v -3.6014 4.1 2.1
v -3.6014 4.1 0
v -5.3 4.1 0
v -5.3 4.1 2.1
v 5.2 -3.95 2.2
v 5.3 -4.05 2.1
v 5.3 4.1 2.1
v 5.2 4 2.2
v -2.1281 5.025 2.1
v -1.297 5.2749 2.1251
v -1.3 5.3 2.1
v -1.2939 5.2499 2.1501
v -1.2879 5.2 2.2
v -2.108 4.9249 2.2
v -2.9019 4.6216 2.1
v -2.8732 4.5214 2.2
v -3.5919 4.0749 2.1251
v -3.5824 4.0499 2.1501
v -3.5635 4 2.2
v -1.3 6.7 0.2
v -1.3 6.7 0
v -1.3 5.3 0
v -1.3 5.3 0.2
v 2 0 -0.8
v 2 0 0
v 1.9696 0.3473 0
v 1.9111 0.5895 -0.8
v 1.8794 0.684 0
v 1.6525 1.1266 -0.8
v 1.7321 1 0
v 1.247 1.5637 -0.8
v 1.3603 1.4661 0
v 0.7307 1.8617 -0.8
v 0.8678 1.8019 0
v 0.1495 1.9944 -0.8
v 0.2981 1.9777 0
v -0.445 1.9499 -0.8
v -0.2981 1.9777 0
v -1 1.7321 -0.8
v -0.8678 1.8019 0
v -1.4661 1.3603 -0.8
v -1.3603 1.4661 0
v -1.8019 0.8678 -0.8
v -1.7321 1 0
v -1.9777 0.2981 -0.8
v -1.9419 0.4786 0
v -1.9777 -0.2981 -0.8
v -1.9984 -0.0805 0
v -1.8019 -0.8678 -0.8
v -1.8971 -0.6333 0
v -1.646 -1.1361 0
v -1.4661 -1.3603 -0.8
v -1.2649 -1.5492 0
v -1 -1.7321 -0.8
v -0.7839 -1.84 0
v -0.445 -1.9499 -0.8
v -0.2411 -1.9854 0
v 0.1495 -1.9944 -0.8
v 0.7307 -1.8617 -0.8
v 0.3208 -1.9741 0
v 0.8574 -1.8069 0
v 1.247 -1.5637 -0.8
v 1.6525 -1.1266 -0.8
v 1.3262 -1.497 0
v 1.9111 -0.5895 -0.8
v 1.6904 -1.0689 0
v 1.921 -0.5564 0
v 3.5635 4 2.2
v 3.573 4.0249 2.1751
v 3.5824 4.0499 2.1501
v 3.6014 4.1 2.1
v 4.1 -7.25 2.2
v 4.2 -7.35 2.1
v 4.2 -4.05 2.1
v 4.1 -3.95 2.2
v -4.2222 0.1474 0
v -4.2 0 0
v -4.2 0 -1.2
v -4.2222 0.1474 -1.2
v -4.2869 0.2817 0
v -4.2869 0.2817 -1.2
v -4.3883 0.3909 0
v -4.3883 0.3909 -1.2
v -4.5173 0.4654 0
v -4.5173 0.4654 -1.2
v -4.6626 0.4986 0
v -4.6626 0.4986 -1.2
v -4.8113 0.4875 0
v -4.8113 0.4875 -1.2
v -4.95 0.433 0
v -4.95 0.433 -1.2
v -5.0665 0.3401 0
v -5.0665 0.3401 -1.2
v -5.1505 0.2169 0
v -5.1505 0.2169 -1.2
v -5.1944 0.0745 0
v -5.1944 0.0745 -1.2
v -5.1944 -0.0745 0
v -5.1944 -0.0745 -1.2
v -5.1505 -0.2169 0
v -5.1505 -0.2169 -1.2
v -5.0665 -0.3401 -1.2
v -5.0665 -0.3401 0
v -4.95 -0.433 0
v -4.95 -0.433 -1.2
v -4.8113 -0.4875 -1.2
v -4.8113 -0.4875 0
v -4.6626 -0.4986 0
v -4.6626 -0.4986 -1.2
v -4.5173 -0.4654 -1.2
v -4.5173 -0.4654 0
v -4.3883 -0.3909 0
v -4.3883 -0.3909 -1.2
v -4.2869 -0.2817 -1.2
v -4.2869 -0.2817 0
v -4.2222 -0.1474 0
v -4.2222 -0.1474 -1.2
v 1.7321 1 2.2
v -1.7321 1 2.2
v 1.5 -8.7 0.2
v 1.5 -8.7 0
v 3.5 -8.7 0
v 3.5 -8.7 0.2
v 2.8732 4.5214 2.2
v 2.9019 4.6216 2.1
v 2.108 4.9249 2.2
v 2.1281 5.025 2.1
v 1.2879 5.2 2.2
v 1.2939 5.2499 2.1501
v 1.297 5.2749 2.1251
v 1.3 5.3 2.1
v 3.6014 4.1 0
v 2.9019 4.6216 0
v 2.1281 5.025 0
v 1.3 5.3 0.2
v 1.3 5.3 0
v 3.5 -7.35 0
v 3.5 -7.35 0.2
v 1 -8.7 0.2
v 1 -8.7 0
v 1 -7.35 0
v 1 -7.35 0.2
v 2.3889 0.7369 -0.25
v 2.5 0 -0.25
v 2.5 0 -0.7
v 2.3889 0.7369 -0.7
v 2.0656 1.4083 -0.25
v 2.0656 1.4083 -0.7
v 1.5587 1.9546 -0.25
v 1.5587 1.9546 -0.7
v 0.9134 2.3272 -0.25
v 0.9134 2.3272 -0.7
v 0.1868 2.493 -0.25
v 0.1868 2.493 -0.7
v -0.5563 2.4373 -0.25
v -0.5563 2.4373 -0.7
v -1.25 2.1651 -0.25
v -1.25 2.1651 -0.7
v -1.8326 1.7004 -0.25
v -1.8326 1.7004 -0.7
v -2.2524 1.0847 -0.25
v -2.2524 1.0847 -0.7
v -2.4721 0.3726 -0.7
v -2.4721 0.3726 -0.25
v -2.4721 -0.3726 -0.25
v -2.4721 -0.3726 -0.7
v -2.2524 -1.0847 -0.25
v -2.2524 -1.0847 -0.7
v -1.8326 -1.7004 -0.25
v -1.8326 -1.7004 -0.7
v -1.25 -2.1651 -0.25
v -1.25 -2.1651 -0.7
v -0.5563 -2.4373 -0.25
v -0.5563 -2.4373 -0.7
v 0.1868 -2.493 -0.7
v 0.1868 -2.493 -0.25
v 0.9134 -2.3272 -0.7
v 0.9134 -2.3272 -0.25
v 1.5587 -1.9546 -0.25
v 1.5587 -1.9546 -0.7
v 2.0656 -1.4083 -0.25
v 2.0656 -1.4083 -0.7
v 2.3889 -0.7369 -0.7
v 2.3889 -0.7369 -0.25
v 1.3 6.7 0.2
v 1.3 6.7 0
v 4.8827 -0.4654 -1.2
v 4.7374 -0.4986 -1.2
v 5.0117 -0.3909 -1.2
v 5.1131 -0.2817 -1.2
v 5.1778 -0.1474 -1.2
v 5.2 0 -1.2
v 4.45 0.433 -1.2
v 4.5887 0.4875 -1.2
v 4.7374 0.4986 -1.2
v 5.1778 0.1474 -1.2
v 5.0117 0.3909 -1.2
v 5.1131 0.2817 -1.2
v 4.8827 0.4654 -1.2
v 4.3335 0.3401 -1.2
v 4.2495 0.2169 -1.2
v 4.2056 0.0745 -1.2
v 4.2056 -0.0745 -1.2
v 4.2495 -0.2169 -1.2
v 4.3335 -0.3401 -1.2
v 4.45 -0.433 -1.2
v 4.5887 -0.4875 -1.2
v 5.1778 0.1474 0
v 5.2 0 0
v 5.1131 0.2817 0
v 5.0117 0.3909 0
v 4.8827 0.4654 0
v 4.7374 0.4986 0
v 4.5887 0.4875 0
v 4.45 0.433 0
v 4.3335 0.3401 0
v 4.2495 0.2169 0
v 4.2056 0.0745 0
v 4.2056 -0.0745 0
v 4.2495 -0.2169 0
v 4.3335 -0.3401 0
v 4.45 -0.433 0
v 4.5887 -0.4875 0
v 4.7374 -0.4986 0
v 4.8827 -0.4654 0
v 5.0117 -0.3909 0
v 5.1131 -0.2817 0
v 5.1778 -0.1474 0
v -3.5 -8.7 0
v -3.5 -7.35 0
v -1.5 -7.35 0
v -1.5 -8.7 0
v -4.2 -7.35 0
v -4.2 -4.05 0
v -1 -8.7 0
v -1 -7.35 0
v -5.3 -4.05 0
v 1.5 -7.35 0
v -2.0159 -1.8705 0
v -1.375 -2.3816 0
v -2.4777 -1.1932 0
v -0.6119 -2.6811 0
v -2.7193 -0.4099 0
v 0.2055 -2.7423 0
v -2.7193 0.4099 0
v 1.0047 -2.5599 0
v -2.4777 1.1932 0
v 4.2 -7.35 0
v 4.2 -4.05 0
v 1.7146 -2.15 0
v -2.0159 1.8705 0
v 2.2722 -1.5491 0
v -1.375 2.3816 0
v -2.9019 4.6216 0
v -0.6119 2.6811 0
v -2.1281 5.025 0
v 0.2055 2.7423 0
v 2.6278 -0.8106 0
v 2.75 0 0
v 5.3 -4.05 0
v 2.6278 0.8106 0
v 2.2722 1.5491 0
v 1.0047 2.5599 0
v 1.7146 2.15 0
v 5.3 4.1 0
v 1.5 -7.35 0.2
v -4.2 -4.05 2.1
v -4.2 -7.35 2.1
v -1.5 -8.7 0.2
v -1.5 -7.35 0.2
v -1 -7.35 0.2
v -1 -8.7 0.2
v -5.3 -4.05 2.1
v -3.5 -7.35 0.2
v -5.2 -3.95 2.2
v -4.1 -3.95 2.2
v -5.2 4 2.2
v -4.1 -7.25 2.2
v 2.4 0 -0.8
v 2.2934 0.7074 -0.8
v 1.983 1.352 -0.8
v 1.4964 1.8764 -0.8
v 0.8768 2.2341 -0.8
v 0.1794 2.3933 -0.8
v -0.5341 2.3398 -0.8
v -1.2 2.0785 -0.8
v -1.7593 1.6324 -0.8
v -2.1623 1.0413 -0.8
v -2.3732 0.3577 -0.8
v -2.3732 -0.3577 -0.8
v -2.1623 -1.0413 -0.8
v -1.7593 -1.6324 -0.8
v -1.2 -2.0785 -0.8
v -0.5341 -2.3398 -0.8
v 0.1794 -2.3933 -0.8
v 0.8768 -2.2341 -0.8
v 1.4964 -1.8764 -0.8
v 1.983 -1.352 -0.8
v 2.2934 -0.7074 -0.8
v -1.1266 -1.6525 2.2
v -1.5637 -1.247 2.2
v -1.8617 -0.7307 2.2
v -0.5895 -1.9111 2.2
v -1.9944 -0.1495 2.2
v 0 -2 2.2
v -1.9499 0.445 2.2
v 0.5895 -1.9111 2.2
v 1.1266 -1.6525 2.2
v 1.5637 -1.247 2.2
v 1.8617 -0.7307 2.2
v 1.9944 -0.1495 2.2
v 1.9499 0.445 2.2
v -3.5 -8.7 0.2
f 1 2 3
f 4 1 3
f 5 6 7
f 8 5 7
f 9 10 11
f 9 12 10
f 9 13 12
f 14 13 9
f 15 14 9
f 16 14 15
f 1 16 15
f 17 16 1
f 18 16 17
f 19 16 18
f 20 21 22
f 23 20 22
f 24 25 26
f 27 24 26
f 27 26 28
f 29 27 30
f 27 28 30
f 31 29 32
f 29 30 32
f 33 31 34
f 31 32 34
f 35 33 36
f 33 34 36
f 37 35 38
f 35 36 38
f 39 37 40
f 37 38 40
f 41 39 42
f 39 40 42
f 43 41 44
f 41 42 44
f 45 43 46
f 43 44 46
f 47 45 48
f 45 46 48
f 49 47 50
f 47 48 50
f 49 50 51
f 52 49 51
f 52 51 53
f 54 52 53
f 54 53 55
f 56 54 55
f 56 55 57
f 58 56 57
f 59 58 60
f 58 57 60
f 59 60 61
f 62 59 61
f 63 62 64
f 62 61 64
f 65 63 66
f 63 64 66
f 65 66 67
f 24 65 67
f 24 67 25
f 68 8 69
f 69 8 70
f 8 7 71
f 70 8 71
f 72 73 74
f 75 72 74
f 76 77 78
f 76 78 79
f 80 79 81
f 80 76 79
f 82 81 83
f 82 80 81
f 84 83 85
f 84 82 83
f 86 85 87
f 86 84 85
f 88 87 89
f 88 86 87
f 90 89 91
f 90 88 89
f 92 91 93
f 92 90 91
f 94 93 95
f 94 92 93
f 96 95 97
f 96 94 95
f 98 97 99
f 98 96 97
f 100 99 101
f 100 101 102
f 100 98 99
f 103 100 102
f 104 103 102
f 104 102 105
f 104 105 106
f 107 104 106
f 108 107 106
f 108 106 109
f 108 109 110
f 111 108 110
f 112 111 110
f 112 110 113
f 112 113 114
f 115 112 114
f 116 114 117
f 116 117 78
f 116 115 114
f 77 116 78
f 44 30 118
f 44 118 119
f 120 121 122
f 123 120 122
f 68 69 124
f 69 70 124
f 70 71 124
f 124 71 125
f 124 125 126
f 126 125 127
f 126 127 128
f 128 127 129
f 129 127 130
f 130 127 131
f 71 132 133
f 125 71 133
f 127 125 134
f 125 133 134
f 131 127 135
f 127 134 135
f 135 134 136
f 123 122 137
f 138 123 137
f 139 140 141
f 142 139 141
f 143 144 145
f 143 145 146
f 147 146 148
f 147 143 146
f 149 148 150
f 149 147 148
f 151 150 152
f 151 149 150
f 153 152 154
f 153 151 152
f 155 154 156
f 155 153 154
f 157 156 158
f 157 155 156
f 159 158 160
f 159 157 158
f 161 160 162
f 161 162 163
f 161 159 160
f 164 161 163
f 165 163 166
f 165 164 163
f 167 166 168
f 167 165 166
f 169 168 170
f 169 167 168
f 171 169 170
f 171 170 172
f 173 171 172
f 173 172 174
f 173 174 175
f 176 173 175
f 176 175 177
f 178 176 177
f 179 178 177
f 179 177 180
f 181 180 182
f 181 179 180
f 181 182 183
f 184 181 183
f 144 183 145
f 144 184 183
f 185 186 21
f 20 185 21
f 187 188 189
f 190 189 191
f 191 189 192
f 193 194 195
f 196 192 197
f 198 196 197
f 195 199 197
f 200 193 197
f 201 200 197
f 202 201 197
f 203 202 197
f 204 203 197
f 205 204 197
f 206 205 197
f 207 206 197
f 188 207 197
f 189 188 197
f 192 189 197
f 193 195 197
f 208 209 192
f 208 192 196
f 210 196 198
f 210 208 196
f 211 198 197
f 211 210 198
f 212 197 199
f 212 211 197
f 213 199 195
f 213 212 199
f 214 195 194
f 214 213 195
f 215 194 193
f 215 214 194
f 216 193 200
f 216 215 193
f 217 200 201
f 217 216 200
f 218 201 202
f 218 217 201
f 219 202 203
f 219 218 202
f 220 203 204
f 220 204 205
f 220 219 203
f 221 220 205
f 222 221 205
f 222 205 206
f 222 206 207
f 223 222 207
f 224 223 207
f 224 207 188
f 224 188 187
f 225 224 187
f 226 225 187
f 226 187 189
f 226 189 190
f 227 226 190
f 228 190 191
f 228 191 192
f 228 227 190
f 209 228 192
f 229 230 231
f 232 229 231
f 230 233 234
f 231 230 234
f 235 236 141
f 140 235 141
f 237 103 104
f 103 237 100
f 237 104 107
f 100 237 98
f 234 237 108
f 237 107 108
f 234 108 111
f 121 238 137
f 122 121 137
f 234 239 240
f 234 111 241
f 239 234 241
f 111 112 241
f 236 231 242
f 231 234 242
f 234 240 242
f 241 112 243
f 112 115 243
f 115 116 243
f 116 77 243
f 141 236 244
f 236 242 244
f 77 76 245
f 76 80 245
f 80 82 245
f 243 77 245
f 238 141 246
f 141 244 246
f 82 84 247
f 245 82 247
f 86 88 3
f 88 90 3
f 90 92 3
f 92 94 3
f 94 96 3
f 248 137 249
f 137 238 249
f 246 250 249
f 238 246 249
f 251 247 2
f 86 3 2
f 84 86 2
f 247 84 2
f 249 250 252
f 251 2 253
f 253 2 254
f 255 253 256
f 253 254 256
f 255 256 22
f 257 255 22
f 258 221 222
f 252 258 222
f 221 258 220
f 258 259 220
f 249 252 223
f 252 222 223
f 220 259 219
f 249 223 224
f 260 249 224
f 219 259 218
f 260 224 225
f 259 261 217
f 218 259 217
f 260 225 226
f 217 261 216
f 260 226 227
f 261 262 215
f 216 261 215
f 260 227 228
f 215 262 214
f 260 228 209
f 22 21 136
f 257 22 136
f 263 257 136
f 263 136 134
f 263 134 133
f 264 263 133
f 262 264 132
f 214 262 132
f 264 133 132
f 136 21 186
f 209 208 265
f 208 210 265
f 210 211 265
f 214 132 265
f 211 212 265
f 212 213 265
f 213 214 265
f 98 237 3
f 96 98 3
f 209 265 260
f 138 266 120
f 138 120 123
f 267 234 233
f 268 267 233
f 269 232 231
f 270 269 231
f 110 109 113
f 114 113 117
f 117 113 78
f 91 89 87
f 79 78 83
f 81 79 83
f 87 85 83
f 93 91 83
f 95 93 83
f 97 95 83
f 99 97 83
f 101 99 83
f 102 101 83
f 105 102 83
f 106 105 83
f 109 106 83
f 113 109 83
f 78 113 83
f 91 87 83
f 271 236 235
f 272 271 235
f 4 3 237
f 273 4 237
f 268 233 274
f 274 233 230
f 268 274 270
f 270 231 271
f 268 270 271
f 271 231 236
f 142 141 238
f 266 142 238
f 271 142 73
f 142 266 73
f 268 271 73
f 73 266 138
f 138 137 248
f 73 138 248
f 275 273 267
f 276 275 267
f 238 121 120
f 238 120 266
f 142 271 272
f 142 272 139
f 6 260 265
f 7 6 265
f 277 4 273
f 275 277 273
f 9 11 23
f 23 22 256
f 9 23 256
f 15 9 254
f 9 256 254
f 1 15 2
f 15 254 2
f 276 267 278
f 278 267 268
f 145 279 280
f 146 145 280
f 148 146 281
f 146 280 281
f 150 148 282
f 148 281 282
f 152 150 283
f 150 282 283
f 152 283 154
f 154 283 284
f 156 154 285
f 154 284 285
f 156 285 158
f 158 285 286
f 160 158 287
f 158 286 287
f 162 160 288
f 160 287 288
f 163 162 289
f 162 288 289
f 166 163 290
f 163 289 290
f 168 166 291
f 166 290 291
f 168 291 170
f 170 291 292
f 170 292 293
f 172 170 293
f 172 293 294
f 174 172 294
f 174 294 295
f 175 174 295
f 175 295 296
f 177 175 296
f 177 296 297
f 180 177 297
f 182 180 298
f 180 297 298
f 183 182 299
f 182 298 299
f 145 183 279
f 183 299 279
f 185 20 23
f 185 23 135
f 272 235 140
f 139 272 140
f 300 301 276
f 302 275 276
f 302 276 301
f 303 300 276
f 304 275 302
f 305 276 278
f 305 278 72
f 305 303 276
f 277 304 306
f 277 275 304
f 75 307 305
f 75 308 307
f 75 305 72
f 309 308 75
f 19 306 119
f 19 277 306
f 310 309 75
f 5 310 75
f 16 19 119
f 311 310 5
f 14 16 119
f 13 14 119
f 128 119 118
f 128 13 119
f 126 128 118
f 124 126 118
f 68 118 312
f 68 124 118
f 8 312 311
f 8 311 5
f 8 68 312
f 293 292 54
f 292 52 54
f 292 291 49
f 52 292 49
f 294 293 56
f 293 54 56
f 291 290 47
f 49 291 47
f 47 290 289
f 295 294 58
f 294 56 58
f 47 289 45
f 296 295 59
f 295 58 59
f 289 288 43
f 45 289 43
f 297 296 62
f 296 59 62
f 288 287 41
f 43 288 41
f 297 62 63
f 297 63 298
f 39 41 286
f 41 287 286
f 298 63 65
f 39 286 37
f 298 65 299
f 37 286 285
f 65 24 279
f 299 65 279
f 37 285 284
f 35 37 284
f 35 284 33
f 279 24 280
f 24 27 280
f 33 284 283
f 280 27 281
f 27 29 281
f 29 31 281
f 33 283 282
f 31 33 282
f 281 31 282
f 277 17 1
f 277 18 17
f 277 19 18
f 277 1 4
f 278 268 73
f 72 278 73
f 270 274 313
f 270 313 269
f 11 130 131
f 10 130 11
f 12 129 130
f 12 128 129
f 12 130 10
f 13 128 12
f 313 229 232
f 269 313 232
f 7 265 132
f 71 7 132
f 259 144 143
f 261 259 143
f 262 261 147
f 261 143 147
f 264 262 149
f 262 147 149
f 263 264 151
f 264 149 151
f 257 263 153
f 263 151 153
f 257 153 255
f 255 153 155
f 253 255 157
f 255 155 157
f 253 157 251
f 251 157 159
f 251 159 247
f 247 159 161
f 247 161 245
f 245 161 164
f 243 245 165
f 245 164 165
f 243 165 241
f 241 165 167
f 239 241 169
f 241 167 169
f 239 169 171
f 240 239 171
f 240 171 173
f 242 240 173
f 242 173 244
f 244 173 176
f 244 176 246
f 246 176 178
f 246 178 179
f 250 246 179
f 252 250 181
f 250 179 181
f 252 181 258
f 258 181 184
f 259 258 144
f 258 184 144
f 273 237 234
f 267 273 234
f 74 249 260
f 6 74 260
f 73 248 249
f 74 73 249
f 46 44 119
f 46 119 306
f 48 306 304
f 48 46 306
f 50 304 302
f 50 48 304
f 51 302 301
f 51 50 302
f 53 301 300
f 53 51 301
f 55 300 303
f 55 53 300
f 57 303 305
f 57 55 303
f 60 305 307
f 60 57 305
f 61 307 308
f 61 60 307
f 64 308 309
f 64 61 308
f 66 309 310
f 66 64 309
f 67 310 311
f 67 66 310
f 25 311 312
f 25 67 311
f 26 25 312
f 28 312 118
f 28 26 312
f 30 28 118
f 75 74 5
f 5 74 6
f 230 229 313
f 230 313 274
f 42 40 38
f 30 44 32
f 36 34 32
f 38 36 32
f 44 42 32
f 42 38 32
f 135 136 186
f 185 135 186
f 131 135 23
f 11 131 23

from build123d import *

# Parameters (mm, degrees)
MODEL_R        = 0.5
MODEL_R_2      = 2.5
MODEL_R_3      = 2
EXTRUDE1_DEPTH = 2.2
SKETCH_W       = 1
SKETCH_H       = 1.35
EXTRUDE2_DEPTH = 0.2
SKETCH_2_R     = 2.5
SKETCH_2_R_2   = 2
EXTRUDE3_DEPTH = 0.8
SKETCH_3_R     = 0.5
EXTRUDE4_DEPTH = 1.2
CHAMFER1_SIZE  = 0.1
CHAMFER2_SIZE  = 0.25
CHAMFER3_SIZE  = 0.1
EXTRUDE5_START = -2.2
EXTRUDE5_DEPTH = 2.2


# Read off the part's stored shape, not the designer's step: Extrude5
with BuildPart() as part:
    # Model → Extrude1 (new body)
    # profile 1 of 5: a face of its own
    with BuildSketch(Plane.XY):
        with BuildLine():
            Line((0, 5.3), (-1.3, 5.3))
            ThreePointArc((-1.3, 5.3), (-2.523074038, 4.838811569), (-3.601388621, 4.1))
            Line((-3.601388621, 4.1), (-5.3, 4.1))
            Line((-5.3, 4.1), (-5.3, 0))
            Line((-5.3, 0), (-5.3, -4.05))
            Line((-5.3, -4.05), (-4.2, -4.05))
            Line((-4.2, -4.05), (-4.2, -7.35))
            Line((-4.2, -7.35), (0, -7.35))
            Line((0, -7.35), (4.2, -7.35))
            Line((4.2, -7.35), (4.2, -4.05))
            Line((4.2, -4.05), (5.3, -4.05))
            Line((5.3, -4.05), (5.3, 0))
            Line((5.3, 0), (5.3, 4.1))
            Line((5.3, 4.1), (3.601388621, 4.1))
            ThreePointArc((3.601388621, 4.1), (2.523074038, 4.838811569), (1.3, 5.3))
            Line((1.3, 5.3), (0, 5.3))
        make_face()
        with Locations((4.7, 0)):
            Circle(MODEL_R, mode=Mode.SUBTRACT)
        with Locations((-4.7, 0)):
            Circle(MODEL_R, mode=Mode.SUBTRACT)
        Circle(MODEL_R_2, mode=Mode.SUBTRACT)
    # profile 2 of 5: a face of its own
    with BuildSketch(Plane.XY):
        with Locations((-4.7, 0)):
            Circle(MODEL_R)
    # profile 3 of 5: a face of its own
    with BuildSketch(Plane.XY):
        with Locations((4.7, 0)):
            Circle(MODEL_R)
    # profile 4 of 5: a face of its own
    with BuildSketch(Plane.XY):
        Circle(MODEL_R_2)
        Circle(MODEL_R_3, mode=Mode.SUBTRACT)
    # profile 5 of 5: a face of its own
    with BuildSketch(Plane.XY):
        Circle(MODEL_R_3)
    extrude(amount=EXTRUDE1_DEPTH)

    # Sketch → Extrude2 (add)
    with BuildSketch(Plane.XY):
        Polygon((0, 6.7), (-1.3, 6.7), (-1.3, 5.3), (0, 5.3), (1.3, 5.3), (1.3, 6.7), align=None)
        with Locations((-2, -8.025)):
            Rectangle(SKETCH_W, SKETCH_H)
        with Locations((-3, -8.025)):
            Rectangle(SKETCH_W, SKETCH_H)
        Polygon((1, -8.7), (1, -7.35), (0, -7.35), (-1, -7.35), (-1, -8.7), (0, -8.7), align=None)
        with Locations((2, -8.025)):
            Rectangle(SKETCH_W, SKETCH_H)
        with Locations((3, -8.025)):
            Rectangle(SKETCH_W, SKETCH_H)
    extrude(amount=EXTRUDE2_DEPTH)

    # Sketch 2 → Extrude3 (add)
    with BuildSketch(Plane.XY):
        Circle(SKETCH_2_R)
        Circle(SKETCH_2_R_2, mode=Mode.SUBTRACT)
    extrude(amount=-EXTRUDE3_DEPTH)

    # Sketch 3 → Extrude4 (add)
    with BuildSketch(Plane.XY):
        with Locations((4.7, 0)):
            Circle(SKETCH_3_R)
        with Locations((-4.7, 0)):
            Circle(SKETCH_3_R)
    extrude(amount=-EXTRUDE4_DEPTH)

    # Chamfer1
    chamfer1_edges = [part.edges().sort_by_distance(p)[0] for p in [
        (-4.450694311, 4.1, 2.2),
        (-5.3, 0.025, 2.2),
        (-4.75, -4.05, 2.2),
        (-4.2, -5.7, 2.2),
        (0, -7.35, 2.2),
        (4.2, -5.7, 2.2),
        (0, 5.3, 2.2),
        (4.75, -4.05, 2.2),
        (5.3, 0.025, 2.2),
        (4.450694311, 4.1, 2.2),
        (2.523074038, 4.838811569, 2.2),
        (-2.523074038, 4.838811569, 2.2),
    ]]
    chamfer(chamfer1_edges, length=CHAMFER1_SIZE)

    # Chamfer2
    chamfer2_edges = [part.edges().sort_by_distance(p)[0] for p in [
        (-2.5, 0, 0),
    ]]
    chamfer(chamfer2_edges, length=CHAMFER2_SIZE)

    # Chamfer3
    chamfer3_edges = [part.edges().sort_by_distance(p)[0] for p in [
        (-2.5, 0, -0.8),
    ]]
    chamfer(chamfer3_edges, length=CHAMFER3_SIZE)

    # Extrude5 outline → Extrude5 (cut)
    with BuildSketch(Plane.XY.offset(2.2).offset(EXTRUDE5_START)):
        with BuildLine():
            ThreePointArc((-1.732050808, 1), (0, -2), (1.732050808, 1))
            Line((1.732050808, 1), (-1.732050808, 1))
        make_face()
    extrude(amount=EXTRUDE5_DEPTH, mode=Mode.SUBTRACT)


solid = part.part
